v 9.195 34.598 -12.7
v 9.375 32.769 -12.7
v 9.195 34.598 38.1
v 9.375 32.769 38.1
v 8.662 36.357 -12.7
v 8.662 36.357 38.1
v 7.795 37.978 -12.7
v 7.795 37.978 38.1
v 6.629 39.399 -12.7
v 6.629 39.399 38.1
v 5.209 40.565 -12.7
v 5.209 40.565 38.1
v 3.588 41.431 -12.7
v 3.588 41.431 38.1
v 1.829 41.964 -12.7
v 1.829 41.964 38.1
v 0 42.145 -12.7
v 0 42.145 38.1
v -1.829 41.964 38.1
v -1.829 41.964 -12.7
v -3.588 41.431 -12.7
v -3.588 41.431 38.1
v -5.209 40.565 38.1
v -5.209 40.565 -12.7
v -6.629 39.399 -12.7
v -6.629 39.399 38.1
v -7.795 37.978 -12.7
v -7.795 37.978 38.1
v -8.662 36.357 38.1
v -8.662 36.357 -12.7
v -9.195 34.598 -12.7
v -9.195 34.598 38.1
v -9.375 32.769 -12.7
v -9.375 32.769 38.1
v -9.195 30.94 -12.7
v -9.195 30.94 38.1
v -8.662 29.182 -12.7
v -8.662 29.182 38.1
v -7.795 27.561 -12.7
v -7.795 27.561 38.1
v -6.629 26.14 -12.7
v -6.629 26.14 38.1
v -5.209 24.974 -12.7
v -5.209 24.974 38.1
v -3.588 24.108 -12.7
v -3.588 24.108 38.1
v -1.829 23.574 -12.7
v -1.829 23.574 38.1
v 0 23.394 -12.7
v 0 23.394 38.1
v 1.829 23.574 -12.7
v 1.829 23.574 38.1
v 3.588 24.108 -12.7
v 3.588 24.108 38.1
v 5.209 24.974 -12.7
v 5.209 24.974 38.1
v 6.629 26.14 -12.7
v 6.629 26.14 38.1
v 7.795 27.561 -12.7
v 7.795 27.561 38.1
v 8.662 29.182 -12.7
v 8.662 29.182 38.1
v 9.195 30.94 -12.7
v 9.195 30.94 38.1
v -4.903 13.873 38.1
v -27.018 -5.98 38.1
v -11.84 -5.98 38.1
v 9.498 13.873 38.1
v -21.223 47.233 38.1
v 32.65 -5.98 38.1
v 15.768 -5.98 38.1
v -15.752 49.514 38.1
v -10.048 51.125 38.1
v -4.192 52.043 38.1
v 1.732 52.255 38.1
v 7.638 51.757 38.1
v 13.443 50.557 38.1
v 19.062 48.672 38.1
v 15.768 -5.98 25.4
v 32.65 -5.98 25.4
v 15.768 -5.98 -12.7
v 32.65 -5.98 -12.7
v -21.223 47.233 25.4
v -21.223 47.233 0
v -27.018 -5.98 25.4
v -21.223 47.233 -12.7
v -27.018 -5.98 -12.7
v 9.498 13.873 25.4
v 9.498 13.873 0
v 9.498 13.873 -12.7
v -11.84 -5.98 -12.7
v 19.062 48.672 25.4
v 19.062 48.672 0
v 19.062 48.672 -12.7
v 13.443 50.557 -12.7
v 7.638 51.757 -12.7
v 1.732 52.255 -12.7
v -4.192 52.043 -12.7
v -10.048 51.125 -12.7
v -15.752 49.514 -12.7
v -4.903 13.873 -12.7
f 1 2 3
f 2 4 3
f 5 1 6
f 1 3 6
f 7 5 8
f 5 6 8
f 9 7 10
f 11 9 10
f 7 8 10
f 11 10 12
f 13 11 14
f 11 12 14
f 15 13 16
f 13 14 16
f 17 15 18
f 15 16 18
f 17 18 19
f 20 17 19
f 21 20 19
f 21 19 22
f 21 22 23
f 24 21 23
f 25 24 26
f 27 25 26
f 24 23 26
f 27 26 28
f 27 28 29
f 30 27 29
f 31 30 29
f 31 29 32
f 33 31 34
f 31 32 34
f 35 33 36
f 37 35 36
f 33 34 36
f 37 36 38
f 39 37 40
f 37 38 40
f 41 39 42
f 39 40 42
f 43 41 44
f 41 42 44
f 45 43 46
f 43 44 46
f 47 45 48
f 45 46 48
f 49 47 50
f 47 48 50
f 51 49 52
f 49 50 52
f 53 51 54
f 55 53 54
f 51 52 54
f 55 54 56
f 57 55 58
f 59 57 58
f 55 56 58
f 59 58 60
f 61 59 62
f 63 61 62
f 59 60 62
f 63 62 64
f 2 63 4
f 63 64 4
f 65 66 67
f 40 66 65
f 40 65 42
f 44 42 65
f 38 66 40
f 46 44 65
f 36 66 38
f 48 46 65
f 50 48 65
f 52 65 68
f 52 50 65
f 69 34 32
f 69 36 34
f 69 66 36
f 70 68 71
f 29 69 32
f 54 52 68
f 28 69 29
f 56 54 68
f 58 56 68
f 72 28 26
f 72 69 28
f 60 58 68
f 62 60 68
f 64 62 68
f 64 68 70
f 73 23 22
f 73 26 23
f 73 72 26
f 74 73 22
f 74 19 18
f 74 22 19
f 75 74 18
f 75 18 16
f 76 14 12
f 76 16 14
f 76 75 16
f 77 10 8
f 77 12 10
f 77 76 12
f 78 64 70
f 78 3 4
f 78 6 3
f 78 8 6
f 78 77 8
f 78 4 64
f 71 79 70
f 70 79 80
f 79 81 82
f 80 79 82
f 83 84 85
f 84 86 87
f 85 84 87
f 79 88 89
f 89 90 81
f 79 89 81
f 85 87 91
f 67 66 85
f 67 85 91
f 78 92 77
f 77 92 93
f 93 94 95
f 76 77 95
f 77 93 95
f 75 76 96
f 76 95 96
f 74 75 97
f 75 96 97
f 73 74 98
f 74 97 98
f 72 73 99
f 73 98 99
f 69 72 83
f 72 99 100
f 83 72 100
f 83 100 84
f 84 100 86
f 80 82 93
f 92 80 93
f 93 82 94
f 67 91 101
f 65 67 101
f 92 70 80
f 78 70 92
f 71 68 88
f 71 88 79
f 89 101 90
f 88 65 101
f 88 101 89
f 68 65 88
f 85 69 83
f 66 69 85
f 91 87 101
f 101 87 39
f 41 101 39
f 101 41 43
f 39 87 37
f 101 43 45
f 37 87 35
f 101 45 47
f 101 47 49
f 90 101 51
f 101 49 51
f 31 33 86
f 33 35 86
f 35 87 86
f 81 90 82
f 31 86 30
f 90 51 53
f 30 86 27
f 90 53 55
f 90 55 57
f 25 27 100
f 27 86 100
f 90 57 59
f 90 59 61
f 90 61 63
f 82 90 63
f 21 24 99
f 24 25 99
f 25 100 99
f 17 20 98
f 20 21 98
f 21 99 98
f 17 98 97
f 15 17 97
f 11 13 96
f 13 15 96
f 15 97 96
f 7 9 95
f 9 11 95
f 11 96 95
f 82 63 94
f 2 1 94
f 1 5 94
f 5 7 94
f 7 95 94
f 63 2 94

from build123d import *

# Parameters (mm, degrees)
F1_DEPTH = 25.4
F2_DEPTH = 12.7
F3_R     = 9.3751640111
F4_DEPTH = 12.7
F5_DEPTH = 38.101


with BuildPart() as f1:
    # F0 (on Top) → F1 (new body)
    with BuildSketch(Plane.XY):
        with BuildLine():
            Line((32.6498188078, -5.9798206203), (19.062470553, 48.6717349119))
            ThreePointArc((19.062470553, 48.6717349119), (-1.2334703342, 52.2374412428), (-21.2233329751, 47.2329562812))
            Line((-21.2233329751, 47.2329562812), (-27.0181472742, -5.9798206203))
            Line((-27.0181472742, -5.9798206203), (-11.8400434842, -5.9798206203))
            Line((-11.8400434842, -5.9798206203), (-4.9034534022, 13.8731840998))
            Line((-4.9034534022, 13.8731840998), (9.4984725438, 13.8731840998))
            Line((9.4984725438, 13.8731840998), (15.767841556, -5.9798206203))
            Line((15.767841556, -5.9798206203), (32.6498188078, -5.9798206203))
        make_face()
    extrude(amount=F1_DEPTH)

    # F0 (on Top) + F1_face (on face) → F2 (join, symmetric)
    with BuildSketch(Plane.XY):
        with BuildLine():
            Line((32.6498188078, -5.9798206203), (19.062470553, 48.6717349119))
            ThreePointArc((19.062470553, 48.6717349119), (-1.2334703342, 52.2374412428), (-21.2233329751, 47.2329562812))
            Line((-21.2233329751, 47.2329562812), (-27.0181472742, -5.9798206203))
            Line((-27.0181472742, -5.9798206203), (-11.8400434842, -5.9798206203))
            Line((-11.8400434842, -5.9798206203), (-4.9034534022, 13.8731840998))
            Line((-4.9034534022, 13.8731840998), (9.4984725438, 13.8731840998))
            Line((9.4984725438, 13.8731840998), (15.767841556, -5.9798206203))
            Line((15.767841556, -5.9798206203), (32.6498188078, -5.9798206203))
        make_face()
    with BuildSketch(Plane(origin=(0.8435409234, 23.5753340068, 25.4), x_dir=(1, 0, 0), z_dir=(0, 0, 1))):
        with BuildLine():
            Line((31.8062778844, -29.5551546271), (18.2189296295, 25.0964009052))
            ThreePointArc((18.2189296295, 25.0964009052), (-2.0770112576, 28.662107236), (-22.0668738986, 23.6576222744))
            Line((-22.0668738986, 23.6576222744), (-27.8616881976, -29.5551546271))
            Line((-27.8616881976, -29.5551546271), (-12.6835844076, -29.5551546271))
            Line((-12.6835844076, -29.5551546271), (-5.7469943256, -9.702149907))
            Line((-5.7469943256, -9.702149907), (8.6549316203, -9.702149907))
            Line((8.6549316203, -9.702149907), (14.9243006326, -29.5551546271))
            Line((14.9243006326, -29.5551546271), (31.8062778844, -29.5551546271))
        make_face()
    extrude(amount=F2_DEPTH, both=True)

    # F3 (on face) → F4 (cut, symmetric)
    with BuildSketch(Plane.XY.offset(38.1)):
        with Locations((0, 32.7694192529)):
            Circle(F3_R)
    extrude(amount=F4_DEPTH, both=True, mode=Mode.SUBTRACT)

    # F5 (cut, through all): a face of the model
    f5_faces = [f1.faces().sort_by_distance(p)[0] for p in [
        (0, 32.7694192529, 25.4),
    ]]
    extrude(f5_faces, amount=-F5_DEPTH, mode=Mode.SUBTRACT)


solid = f1.part
